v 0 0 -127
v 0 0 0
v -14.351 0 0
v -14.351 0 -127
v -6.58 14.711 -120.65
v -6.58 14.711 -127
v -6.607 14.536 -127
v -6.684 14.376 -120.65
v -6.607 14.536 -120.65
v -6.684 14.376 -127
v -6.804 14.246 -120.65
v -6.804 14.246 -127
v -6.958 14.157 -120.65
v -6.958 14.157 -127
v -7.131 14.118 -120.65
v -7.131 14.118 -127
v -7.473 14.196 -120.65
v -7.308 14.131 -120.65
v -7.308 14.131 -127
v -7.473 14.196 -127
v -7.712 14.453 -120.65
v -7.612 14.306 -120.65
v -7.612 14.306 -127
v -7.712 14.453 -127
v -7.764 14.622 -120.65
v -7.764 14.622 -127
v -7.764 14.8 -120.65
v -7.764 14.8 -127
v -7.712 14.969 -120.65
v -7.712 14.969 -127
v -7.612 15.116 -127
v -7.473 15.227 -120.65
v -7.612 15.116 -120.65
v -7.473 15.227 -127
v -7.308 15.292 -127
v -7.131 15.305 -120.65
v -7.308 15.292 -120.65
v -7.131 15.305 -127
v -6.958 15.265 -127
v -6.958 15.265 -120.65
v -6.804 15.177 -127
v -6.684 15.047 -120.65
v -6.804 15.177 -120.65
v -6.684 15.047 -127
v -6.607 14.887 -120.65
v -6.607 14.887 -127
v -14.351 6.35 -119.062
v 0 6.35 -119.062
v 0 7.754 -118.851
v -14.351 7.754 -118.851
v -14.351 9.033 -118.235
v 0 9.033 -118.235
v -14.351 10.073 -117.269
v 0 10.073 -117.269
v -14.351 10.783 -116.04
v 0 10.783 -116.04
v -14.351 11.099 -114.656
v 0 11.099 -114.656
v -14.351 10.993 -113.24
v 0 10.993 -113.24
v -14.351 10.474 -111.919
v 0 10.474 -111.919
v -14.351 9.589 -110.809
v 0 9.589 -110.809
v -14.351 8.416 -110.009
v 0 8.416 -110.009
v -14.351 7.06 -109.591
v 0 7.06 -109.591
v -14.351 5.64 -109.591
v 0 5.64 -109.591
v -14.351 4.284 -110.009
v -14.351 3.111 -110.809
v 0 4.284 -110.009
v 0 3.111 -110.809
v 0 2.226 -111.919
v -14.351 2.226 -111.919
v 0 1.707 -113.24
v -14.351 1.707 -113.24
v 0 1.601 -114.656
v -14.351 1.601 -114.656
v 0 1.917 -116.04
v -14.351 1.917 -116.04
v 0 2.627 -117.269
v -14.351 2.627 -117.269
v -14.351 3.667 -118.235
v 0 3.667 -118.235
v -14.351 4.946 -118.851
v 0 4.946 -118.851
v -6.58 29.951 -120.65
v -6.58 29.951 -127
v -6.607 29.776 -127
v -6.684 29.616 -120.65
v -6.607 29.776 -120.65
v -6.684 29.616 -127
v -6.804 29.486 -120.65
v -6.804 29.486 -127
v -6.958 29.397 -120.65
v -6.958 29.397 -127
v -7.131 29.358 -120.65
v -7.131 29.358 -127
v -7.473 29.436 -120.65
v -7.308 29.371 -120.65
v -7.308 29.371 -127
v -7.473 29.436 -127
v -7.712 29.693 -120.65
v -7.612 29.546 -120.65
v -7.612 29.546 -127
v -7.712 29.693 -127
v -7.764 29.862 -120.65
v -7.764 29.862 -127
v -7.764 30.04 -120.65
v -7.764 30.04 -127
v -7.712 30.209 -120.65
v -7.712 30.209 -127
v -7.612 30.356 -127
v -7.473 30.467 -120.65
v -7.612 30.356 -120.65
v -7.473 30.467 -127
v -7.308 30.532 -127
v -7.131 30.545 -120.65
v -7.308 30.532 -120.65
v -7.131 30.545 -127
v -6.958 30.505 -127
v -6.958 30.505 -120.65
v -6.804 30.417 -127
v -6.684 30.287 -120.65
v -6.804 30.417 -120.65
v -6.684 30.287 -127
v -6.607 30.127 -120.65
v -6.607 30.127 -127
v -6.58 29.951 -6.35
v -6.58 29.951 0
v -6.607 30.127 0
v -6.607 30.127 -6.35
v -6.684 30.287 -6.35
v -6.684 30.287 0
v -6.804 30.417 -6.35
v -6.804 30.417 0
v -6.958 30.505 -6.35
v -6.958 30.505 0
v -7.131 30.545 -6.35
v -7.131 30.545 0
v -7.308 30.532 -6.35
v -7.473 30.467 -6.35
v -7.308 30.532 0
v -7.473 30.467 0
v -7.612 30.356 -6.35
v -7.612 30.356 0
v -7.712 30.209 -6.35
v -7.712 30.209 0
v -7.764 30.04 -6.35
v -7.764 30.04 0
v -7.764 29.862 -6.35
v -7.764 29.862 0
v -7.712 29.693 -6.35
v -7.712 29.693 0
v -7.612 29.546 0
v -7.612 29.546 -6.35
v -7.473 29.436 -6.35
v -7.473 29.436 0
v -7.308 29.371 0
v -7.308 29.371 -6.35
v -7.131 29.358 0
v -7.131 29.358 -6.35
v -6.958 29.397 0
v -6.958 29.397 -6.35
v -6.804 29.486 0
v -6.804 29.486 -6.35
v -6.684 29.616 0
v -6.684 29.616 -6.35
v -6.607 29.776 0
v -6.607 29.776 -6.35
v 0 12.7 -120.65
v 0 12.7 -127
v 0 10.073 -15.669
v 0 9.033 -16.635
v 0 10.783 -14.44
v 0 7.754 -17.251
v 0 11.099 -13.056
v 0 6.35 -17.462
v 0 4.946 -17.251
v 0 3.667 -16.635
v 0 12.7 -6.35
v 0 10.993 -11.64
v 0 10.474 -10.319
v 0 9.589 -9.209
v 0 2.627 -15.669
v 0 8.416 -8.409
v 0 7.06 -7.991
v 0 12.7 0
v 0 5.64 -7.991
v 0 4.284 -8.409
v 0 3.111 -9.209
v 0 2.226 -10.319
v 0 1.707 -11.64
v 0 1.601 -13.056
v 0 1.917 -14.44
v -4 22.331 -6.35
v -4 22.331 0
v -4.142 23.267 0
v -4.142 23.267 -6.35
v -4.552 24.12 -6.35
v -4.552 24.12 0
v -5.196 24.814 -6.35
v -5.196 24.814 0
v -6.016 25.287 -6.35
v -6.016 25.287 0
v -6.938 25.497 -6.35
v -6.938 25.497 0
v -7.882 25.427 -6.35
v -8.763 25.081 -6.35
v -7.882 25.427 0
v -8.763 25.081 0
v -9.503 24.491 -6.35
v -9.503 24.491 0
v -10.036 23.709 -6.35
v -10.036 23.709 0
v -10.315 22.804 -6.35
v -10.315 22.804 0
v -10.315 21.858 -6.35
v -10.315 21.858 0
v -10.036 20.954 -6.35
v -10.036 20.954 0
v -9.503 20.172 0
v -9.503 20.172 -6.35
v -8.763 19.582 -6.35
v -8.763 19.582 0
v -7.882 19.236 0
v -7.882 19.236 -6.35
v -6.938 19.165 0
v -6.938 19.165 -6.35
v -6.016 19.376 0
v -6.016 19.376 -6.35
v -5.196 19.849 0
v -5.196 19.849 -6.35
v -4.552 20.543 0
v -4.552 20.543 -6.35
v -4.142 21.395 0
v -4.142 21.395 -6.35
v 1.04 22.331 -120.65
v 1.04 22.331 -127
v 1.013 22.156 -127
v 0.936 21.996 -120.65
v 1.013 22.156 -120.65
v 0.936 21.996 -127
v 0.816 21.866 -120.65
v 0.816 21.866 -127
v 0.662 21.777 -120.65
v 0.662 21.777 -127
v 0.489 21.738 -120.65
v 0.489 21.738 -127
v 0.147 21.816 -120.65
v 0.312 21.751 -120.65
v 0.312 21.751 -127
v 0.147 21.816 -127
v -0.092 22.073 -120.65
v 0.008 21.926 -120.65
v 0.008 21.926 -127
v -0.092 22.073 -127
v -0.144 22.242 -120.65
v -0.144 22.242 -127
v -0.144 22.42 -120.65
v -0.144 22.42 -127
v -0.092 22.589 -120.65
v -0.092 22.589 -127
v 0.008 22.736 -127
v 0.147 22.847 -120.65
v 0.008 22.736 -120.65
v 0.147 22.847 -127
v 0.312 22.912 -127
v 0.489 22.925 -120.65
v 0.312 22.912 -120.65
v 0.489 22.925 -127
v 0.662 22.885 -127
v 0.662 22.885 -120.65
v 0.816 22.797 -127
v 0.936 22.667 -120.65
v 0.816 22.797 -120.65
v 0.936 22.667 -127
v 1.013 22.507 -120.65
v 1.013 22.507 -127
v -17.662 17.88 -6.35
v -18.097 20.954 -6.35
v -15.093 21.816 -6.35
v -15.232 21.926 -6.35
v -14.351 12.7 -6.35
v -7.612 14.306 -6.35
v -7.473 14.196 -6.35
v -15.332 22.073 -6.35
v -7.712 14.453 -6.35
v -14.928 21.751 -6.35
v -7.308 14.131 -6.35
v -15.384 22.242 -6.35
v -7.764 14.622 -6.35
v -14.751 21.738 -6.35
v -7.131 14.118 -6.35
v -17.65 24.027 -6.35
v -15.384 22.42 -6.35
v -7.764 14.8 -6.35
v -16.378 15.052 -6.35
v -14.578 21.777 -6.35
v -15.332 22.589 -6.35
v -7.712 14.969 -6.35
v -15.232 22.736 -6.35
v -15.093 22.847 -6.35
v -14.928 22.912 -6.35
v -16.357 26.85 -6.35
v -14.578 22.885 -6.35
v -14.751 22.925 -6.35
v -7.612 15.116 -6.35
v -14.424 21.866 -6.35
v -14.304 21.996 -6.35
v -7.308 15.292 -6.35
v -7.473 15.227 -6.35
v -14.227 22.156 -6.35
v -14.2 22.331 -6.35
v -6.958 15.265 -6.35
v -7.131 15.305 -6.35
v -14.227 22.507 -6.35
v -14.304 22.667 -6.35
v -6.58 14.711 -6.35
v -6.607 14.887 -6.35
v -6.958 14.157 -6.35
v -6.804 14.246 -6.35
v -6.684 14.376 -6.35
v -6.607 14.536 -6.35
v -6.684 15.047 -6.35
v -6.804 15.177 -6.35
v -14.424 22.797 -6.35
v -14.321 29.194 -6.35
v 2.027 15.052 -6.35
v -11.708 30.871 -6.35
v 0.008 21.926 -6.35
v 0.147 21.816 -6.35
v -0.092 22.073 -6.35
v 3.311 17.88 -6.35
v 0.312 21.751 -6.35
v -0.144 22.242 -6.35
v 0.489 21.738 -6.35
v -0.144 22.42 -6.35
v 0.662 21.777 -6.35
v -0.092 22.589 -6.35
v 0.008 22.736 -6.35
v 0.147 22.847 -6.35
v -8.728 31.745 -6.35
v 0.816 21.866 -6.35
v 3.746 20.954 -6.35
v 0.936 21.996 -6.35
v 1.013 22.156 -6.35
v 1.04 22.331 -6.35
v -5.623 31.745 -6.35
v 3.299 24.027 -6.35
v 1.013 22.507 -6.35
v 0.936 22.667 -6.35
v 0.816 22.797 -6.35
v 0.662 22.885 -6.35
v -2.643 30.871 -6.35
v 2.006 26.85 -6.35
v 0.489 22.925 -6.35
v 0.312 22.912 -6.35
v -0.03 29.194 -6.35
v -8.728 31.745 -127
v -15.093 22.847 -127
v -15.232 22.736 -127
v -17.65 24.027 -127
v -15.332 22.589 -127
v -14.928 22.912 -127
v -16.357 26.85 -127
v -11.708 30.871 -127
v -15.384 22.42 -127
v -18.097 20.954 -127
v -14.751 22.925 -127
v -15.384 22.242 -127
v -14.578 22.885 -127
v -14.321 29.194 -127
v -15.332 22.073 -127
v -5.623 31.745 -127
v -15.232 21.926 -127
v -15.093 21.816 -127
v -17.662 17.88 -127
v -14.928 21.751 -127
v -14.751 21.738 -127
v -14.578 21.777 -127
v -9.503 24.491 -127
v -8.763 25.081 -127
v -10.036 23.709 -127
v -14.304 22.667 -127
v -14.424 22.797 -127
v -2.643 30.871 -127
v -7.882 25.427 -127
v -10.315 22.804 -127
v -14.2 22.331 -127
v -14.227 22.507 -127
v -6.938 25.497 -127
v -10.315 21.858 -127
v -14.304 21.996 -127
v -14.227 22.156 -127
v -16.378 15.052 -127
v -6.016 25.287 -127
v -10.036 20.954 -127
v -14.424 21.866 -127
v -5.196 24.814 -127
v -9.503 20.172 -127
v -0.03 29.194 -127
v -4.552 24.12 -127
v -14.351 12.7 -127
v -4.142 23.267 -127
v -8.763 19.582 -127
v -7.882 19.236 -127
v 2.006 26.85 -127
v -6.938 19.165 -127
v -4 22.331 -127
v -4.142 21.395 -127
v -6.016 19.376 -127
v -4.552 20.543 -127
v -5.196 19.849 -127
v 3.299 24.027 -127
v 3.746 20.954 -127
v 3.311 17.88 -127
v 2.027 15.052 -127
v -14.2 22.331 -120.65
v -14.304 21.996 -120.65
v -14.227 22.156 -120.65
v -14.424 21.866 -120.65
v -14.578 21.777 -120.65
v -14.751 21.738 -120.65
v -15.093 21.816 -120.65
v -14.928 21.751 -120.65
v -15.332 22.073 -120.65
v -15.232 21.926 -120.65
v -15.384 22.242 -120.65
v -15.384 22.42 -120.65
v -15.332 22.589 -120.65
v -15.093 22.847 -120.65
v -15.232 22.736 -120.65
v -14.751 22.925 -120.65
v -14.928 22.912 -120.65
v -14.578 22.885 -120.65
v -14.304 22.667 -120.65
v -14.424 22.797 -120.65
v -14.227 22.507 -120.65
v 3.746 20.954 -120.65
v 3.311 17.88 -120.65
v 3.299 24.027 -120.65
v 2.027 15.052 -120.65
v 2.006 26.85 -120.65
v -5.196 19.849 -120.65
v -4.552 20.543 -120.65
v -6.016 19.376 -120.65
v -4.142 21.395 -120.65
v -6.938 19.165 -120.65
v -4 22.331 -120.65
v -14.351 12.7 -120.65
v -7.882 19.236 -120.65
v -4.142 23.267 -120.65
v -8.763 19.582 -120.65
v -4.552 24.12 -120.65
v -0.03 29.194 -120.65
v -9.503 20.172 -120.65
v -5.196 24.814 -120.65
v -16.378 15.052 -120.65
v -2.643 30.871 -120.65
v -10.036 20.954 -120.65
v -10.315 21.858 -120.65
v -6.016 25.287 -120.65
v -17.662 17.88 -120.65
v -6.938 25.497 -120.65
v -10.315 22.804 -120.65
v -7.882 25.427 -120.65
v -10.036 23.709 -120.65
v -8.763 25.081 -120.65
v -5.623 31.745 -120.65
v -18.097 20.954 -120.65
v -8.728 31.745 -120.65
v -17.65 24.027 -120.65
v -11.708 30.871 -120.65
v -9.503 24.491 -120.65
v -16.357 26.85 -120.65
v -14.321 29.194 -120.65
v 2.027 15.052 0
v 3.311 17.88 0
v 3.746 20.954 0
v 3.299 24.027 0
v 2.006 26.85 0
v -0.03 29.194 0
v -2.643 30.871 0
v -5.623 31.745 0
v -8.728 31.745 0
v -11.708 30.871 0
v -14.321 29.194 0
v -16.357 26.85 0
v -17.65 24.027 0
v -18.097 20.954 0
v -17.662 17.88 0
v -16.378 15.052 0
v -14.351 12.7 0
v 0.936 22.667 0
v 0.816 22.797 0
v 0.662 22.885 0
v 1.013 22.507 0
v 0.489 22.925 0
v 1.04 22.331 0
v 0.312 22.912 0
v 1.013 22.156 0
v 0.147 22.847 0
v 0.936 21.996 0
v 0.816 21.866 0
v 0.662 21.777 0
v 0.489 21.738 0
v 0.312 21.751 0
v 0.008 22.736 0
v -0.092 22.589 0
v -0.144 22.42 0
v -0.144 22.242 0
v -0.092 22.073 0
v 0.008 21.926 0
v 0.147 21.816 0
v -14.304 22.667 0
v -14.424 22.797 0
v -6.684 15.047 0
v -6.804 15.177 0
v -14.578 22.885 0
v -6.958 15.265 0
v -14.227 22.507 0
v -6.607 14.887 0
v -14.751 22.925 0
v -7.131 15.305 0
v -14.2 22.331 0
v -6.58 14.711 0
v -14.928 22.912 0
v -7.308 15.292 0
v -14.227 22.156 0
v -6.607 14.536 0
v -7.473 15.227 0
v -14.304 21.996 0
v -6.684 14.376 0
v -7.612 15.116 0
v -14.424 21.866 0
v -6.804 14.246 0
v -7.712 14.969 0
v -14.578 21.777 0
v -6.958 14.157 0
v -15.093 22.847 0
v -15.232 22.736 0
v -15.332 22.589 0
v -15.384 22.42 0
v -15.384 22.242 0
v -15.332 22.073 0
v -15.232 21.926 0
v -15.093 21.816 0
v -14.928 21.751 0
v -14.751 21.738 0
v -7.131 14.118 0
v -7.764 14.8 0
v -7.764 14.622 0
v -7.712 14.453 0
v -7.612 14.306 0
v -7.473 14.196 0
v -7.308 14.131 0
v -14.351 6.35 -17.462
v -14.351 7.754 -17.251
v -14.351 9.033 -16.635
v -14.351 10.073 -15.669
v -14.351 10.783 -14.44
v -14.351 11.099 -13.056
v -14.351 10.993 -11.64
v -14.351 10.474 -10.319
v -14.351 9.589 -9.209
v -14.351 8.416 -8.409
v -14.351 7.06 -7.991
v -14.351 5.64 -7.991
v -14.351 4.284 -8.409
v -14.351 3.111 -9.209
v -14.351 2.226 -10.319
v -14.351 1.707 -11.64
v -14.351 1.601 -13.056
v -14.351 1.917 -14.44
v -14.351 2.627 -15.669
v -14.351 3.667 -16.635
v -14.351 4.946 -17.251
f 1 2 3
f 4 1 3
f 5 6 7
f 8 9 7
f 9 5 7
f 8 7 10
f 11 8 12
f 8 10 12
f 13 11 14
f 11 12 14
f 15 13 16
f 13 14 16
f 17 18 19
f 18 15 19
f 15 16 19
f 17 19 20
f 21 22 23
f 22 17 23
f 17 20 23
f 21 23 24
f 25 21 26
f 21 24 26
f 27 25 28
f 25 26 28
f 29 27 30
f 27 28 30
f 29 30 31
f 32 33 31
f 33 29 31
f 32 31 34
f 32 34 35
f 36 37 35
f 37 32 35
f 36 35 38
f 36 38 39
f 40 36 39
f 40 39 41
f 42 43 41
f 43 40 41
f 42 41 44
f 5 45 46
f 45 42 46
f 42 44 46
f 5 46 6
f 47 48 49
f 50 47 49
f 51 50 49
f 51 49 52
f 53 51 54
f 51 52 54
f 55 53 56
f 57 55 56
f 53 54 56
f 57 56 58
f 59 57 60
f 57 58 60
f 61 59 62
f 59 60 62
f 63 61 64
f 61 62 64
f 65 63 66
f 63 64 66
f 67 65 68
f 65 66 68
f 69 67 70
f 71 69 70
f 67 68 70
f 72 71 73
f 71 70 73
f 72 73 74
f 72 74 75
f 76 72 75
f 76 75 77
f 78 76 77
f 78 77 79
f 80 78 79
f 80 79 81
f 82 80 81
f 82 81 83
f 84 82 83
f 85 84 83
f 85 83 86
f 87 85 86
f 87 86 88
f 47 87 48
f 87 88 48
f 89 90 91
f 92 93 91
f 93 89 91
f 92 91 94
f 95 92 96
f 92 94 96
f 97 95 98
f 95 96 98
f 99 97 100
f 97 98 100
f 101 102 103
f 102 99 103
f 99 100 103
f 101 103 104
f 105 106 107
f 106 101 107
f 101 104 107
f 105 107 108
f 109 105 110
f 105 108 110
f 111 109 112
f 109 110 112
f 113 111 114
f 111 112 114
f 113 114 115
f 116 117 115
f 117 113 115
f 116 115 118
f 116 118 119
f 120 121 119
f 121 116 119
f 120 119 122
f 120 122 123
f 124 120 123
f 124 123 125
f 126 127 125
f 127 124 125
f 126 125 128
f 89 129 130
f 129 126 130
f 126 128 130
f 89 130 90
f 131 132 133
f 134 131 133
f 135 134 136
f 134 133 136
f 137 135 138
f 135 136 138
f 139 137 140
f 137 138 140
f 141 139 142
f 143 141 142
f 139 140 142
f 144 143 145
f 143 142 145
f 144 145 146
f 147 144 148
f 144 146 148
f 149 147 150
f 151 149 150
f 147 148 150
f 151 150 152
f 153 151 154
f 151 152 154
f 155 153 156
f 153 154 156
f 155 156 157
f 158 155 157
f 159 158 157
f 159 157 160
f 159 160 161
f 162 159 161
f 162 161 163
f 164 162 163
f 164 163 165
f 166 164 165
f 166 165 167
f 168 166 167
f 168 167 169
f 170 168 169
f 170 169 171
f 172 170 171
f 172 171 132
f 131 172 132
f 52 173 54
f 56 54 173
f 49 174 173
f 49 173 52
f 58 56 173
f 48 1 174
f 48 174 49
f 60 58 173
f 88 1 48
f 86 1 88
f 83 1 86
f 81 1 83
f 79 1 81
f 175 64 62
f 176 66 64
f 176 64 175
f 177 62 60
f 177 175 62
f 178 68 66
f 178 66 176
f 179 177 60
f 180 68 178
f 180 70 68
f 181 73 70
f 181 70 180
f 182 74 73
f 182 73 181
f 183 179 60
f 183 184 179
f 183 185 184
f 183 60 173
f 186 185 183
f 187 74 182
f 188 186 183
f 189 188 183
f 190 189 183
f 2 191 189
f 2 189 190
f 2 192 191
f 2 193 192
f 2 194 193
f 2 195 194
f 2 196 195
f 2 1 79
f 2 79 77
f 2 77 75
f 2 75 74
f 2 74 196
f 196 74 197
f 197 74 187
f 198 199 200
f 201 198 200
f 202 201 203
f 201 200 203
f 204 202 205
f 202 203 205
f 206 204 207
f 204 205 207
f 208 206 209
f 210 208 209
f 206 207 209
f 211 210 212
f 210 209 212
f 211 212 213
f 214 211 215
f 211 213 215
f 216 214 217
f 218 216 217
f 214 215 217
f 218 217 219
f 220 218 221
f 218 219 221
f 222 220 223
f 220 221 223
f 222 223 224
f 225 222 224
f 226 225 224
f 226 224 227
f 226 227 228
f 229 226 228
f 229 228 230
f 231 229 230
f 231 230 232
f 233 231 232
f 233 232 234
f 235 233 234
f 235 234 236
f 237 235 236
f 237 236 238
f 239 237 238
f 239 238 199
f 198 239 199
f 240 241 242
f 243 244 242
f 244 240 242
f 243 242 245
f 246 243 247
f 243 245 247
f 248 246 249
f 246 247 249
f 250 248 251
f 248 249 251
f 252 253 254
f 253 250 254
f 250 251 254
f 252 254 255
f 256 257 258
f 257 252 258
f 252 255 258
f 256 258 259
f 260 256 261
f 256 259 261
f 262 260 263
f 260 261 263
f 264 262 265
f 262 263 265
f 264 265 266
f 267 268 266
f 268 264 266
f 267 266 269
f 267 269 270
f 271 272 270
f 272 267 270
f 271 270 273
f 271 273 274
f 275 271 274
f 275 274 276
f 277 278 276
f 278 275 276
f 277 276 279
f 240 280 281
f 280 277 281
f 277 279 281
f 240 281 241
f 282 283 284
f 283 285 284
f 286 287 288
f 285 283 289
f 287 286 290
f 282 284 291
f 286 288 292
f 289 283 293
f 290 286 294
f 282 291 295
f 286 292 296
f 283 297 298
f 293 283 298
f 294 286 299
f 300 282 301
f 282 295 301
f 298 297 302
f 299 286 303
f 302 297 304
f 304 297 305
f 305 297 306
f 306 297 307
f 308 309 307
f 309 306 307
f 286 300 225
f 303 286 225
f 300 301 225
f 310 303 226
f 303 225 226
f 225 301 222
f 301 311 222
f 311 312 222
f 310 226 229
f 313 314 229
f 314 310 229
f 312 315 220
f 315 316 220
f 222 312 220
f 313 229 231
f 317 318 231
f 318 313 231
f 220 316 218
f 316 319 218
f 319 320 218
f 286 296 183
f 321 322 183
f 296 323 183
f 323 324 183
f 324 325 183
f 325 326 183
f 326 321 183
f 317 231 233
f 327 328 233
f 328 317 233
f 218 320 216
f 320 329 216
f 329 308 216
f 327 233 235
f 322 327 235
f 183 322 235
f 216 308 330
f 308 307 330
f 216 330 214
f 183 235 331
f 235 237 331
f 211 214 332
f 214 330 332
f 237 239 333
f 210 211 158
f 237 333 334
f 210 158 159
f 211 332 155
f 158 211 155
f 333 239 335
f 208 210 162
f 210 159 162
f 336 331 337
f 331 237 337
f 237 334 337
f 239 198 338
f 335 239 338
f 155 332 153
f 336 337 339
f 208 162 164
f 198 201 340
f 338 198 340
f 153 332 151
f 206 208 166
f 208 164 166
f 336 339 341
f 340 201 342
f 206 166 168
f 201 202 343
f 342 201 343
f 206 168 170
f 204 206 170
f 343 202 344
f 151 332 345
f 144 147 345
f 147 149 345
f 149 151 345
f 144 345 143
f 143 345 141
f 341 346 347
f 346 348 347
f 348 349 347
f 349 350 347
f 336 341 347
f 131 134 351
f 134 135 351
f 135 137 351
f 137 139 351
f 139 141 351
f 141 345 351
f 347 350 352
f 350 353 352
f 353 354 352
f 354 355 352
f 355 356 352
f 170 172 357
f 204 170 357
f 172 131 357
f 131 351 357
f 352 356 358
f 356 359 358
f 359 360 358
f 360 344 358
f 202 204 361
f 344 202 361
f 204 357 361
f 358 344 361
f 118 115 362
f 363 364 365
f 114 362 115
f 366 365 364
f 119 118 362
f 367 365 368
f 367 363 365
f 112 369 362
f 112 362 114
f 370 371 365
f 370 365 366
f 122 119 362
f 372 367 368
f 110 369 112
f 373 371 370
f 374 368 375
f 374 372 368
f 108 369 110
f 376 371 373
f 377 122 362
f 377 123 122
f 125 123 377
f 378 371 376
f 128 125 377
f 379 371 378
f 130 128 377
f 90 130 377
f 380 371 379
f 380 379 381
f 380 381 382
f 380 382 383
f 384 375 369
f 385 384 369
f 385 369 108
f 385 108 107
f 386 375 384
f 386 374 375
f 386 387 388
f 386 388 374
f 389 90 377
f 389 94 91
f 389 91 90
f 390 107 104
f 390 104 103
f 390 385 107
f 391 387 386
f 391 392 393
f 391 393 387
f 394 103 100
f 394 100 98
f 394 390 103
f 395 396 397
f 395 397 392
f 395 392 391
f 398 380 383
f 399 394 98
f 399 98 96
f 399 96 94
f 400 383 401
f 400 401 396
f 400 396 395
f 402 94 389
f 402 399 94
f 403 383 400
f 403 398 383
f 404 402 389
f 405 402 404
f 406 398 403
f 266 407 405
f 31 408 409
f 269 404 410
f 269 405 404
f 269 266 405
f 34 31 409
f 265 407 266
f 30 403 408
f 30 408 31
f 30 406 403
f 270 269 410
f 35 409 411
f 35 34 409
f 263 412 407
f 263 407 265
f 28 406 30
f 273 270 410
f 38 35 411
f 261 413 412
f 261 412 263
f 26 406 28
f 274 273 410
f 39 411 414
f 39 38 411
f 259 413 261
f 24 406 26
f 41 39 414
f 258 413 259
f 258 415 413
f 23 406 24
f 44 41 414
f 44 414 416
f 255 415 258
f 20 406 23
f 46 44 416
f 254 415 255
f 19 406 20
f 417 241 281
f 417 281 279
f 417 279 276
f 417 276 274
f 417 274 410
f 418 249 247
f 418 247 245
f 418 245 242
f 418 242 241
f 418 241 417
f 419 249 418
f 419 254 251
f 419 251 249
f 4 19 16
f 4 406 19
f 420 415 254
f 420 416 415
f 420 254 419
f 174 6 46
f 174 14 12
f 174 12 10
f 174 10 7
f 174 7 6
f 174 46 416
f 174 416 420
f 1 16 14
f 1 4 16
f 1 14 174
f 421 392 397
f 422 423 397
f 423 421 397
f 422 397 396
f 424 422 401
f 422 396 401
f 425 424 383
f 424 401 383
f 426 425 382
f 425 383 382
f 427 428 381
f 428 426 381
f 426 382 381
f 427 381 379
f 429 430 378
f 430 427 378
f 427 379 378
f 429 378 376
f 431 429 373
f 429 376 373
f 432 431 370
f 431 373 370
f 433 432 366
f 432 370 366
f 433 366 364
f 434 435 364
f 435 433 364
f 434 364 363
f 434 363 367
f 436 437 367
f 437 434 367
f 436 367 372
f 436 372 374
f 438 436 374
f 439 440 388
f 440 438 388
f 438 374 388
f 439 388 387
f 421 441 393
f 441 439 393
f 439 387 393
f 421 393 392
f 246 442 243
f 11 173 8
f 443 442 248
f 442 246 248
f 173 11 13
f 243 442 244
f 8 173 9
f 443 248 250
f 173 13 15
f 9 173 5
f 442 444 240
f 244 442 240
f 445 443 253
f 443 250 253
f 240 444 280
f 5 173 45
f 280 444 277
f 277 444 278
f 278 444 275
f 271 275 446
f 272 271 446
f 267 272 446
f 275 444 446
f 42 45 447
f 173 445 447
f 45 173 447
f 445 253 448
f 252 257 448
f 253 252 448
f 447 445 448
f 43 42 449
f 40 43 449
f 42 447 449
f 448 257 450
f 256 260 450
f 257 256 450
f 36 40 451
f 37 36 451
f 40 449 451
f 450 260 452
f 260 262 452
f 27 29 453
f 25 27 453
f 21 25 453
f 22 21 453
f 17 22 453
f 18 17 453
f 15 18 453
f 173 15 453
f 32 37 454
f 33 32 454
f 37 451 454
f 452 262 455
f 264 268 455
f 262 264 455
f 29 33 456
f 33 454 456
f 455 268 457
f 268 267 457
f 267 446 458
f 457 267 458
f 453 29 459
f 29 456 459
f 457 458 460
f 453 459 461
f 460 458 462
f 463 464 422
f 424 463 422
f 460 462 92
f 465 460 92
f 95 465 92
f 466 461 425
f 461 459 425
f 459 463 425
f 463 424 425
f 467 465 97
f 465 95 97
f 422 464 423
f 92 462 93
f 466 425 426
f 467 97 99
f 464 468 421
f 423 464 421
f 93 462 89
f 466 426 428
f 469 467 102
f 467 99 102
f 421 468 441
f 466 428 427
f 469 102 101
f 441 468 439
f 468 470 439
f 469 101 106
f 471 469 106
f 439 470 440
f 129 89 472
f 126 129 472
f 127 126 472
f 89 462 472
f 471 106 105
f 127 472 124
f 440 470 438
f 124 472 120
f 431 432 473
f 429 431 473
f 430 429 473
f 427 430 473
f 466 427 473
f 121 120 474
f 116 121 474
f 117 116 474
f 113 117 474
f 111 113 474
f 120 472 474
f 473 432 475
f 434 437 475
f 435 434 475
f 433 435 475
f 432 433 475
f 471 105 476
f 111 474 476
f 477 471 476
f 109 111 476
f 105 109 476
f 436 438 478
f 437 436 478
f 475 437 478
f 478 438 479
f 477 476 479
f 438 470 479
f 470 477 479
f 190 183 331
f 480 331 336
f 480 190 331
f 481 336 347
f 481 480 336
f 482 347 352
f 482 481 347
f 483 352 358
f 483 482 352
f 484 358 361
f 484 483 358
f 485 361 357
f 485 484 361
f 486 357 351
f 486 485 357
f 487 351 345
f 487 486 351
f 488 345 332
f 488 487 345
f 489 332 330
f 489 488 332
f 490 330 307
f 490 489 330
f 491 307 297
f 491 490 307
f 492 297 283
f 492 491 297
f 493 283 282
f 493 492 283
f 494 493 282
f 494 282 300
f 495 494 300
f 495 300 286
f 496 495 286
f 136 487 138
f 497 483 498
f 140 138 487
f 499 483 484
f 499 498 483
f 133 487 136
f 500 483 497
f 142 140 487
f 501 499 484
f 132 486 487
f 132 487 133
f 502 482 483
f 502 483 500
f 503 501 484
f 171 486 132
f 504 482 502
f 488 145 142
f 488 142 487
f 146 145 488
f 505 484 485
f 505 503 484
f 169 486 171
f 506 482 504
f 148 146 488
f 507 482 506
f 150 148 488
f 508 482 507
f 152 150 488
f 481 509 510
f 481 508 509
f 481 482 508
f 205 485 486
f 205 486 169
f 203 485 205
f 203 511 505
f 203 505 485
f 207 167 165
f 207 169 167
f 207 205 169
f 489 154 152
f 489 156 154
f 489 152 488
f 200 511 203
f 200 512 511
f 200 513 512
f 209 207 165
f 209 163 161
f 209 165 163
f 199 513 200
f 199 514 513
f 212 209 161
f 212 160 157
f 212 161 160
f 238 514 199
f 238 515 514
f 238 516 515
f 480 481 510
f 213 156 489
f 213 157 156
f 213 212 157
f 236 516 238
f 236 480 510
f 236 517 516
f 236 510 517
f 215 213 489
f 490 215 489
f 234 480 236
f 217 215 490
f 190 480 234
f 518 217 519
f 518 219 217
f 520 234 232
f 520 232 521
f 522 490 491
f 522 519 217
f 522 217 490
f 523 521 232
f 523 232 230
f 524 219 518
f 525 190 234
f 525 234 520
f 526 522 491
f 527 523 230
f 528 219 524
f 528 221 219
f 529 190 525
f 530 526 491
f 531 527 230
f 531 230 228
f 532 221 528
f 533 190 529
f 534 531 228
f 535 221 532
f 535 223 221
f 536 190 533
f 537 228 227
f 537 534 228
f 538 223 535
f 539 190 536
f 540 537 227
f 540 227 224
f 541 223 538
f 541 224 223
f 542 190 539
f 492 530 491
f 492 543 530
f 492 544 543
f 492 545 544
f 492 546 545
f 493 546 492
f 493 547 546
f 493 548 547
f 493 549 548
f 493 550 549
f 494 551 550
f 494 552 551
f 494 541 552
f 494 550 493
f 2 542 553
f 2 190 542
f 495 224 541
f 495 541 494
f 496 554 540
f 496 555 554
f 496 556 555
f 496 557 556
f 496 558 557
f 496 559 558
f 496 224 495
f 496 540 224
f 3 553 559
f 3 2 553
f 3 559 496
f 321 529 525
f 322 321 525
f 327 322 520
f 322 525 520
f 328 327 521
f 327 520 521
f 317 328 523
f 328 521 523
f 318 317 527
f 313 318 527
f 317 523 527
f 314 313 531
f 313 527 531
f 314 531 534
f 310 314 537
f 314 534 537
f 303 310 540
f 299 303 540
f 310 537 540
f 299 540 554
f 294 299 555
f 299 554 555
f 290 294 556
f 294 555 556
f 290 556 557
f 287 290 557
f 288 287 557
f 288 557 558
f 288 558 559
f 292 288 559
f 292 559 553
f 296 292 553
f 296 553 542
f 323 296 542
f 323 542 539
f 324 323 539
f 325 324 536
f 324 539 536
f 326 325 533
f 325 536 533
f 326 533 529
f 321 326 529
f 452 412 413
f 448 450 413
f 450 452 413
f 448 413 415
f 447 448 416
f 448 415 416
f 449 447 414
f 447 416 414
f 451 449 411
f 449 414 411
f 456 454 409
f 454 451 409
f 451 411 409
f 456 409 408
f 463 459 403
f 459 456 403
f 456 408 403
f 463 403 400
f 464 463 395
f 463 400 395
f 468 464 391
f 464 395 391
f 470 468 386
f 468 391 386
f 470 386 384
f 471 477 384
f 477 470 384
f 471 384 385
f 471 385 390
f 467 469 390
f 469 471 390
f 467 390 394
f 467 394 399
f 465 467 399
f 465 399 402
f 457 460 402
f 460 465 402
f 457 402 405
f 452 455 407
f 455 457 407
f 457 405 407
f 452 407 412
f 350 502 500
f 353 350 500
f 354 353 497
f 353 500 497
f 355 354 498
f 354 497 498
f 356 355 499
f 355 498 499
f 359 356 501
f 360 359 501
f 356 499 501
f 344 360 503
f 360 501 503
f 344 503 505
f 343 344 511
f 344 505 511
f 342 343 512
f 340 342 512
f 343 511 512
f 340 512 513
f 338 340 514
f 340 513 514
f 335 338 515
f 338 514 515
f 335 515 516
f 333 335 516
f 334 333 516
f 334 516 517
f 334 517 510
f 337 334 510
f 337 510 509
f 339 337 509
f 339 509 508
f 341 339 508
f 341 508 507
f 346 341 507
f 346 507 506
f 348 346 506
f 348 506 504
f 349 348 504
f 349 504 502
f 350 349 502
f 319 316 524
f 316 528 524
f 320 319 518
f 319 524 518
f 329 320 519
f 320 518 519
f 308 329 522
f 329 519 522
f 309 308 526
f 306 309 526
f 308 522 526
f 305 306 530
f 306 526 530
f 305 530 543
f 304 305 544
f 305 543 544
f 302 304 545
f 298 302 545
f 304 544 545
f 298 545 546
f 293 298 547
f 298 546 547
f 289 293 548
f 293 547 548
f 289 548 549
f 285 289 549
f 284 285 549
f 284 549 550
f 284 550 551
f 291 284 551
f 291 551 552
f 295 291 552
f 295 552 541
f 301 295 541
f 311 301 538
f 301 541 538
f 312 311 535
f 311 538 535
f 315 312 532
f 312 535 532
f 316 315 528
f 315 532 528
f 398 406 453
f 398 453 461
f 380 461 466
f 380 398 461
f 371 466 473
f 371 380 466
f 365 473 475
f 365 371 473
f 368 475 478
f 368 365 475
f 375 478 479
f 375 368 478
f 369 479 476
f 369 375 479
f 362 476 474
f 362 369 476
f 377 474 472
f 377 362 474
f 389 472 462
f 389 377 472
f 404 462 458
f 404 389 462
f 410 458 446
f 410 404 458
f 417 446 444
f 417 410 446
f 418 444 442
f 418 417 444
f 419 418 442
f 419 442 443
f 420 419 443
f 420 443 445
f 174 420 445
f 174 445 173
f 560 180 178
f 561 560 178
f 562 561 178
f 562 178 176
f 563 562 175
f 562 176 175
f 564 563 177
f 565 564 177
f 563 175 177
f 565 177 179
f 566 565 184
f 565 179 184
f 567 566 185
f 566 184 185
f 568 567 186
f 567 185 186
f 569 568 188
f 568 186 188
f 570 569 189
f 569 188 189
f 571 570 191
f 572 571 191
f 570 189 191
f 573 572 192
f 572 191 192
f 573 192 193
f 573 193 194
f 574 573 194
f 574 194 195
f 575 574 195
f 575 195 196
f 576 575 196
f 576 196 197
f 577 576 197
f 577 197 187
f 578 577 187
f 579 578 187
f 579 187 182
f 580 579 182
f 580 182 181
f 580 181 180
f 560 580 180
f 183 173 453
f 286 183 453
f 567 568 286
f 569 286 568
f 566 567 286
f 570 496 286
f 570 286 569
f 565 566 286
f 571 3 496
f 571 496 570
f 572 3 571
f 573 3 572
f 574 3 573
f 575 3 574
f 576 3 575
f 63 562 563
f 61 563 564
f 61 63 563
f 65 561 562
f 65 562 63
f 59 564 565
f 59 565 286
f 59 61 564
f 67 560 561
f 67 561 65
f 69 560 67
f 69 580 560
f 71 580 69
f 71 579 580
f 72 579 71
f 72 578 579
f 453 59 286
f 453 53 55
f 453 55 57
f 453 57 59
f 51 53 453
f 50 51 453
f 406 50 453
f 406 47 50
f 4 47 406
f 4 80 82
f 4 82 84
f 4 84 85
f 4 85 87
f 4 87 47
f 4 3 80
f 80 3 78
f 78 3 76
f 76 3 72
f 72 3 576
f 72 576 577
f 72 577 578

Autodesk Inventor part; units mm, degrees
ref_plane "YZ Plane" through (0, 0, 0) normal (1, 0, 0) x (0, 1, 0)
ref_plane "XZ Plane" through (0, 0, 0) normal (0, 1, 0) x (-1, 0, 0)
sketch "Sketch1" plane through (0, 0, 0) normal (0, 1, 0) x (-1, 0, 0)
  line L0 (0, 0) -> (14.351, 0)
  line L1 (14.351, 0) -> (14.351, -127)
  line L2 (14.351, -127) -> (0, -127)
  line L3 (0, -127) -> (0, 0)
  dimension "d0" = 127
  dimension "d1" = 14.351
extrude "Extrusion1" add sketch "Sketch1" along normal blind 12.7
sketch "Sketch2" plane through (0, 0, 0) normal (1, 0, 0) x (0, 0, -1)
  circle A0 centre (12.7, 6.35) radius 4.7625
  circle A1 centre (114.3, 6.35) radius 4.7625
  line L0 (0, 12.7) -> (127, 12.7) projected
  line L1 (127, 0) -> (127, 12.7) projected
  point P0 (0, 0)
  dimension "d4" = 9.525
  dimension "d5" = 9.525
  dimension "d6" = 101.6
  dimension "d7" = 127
  dimension "d8" = 12.7
  dimension "d9" = 12.7
  dimension "d10" = 6.35
  dimension "d11" = 6.35
extrude "Extrusion2" cut sketch "Sketch2" against normal through all
sketch "Sketch3" plane through (-14.351, 0, 0) normal (0, 0, 1) x (1, 0, 0)
  line L0 (0, 12.7) -> (14.351, 12.7) projected
  circle A0 centre (7.1755, 22.3312) radius 9.525
  circle A1 centre (7.1755, 29.9512) radius 0.5953
  circle A2 centre (-0.4445, 22.3312) radius 0.5953
  circle A3 centre (14.7955, 22.3312) radius 0.5953
  circle A4 centre (7.1755, 14.7112) radius 0.5953
  line L1 (14.351, 0) -> (14.351, 12.7) projected
  line L2 (0, 0) -> (0, 12.7) projected
  arc A5 (14.351, 12.7) -> (0, 12.7) centre (7.1755, 20.9342) ccw
  circle A6 centre (7.1755, 22.3312) radius 3.175
  dimension "d15" = 19.05
  dimension "d16" = 1.1906
  dimension "d17" = 1.1906
  dimension "d18" = 1.1906
  dimension "d19" = 1.1906
  dimension "d20" = 7.62
  dimension "d28" = 0
  dimension "d29" = 10.922
  dimension "d32" = 6.35
  dimension "d33" = 7.62
  dimension "d34" = 7.62
  dimension "d35" = 7.62
  dimension "d36" = 0
  dimension "d37" = 9.6312
  dimension "d38" = 0
  dimension "d39" = 0
  dimension "d40" = 0
ref_plane "Work Plane1" through (-14.351, 0, -63.5) normal (0, 0, 1) x (1, 0, 0)
extrude "Extrusion4" add sketch "Sketch3" against normal blind 6.35 contours A0 | A5 L0
mirror "Mirror1" about plane through (-14.351, 0, -63.5) normal (0, 0, 1) of "Extrusion4"
equation "\"d5\" = d4"
equation "\"d8\" = -0.5 * d6 + 0.5 * d7"
equation "\"d10\" = 0.5 * d9"
equation "\"d11\" = d10"
equation "\"d17\" = d16"
equation "\"d18\" = d17"
equation "\"d19\" = d17"
properties part number "axil mount"
